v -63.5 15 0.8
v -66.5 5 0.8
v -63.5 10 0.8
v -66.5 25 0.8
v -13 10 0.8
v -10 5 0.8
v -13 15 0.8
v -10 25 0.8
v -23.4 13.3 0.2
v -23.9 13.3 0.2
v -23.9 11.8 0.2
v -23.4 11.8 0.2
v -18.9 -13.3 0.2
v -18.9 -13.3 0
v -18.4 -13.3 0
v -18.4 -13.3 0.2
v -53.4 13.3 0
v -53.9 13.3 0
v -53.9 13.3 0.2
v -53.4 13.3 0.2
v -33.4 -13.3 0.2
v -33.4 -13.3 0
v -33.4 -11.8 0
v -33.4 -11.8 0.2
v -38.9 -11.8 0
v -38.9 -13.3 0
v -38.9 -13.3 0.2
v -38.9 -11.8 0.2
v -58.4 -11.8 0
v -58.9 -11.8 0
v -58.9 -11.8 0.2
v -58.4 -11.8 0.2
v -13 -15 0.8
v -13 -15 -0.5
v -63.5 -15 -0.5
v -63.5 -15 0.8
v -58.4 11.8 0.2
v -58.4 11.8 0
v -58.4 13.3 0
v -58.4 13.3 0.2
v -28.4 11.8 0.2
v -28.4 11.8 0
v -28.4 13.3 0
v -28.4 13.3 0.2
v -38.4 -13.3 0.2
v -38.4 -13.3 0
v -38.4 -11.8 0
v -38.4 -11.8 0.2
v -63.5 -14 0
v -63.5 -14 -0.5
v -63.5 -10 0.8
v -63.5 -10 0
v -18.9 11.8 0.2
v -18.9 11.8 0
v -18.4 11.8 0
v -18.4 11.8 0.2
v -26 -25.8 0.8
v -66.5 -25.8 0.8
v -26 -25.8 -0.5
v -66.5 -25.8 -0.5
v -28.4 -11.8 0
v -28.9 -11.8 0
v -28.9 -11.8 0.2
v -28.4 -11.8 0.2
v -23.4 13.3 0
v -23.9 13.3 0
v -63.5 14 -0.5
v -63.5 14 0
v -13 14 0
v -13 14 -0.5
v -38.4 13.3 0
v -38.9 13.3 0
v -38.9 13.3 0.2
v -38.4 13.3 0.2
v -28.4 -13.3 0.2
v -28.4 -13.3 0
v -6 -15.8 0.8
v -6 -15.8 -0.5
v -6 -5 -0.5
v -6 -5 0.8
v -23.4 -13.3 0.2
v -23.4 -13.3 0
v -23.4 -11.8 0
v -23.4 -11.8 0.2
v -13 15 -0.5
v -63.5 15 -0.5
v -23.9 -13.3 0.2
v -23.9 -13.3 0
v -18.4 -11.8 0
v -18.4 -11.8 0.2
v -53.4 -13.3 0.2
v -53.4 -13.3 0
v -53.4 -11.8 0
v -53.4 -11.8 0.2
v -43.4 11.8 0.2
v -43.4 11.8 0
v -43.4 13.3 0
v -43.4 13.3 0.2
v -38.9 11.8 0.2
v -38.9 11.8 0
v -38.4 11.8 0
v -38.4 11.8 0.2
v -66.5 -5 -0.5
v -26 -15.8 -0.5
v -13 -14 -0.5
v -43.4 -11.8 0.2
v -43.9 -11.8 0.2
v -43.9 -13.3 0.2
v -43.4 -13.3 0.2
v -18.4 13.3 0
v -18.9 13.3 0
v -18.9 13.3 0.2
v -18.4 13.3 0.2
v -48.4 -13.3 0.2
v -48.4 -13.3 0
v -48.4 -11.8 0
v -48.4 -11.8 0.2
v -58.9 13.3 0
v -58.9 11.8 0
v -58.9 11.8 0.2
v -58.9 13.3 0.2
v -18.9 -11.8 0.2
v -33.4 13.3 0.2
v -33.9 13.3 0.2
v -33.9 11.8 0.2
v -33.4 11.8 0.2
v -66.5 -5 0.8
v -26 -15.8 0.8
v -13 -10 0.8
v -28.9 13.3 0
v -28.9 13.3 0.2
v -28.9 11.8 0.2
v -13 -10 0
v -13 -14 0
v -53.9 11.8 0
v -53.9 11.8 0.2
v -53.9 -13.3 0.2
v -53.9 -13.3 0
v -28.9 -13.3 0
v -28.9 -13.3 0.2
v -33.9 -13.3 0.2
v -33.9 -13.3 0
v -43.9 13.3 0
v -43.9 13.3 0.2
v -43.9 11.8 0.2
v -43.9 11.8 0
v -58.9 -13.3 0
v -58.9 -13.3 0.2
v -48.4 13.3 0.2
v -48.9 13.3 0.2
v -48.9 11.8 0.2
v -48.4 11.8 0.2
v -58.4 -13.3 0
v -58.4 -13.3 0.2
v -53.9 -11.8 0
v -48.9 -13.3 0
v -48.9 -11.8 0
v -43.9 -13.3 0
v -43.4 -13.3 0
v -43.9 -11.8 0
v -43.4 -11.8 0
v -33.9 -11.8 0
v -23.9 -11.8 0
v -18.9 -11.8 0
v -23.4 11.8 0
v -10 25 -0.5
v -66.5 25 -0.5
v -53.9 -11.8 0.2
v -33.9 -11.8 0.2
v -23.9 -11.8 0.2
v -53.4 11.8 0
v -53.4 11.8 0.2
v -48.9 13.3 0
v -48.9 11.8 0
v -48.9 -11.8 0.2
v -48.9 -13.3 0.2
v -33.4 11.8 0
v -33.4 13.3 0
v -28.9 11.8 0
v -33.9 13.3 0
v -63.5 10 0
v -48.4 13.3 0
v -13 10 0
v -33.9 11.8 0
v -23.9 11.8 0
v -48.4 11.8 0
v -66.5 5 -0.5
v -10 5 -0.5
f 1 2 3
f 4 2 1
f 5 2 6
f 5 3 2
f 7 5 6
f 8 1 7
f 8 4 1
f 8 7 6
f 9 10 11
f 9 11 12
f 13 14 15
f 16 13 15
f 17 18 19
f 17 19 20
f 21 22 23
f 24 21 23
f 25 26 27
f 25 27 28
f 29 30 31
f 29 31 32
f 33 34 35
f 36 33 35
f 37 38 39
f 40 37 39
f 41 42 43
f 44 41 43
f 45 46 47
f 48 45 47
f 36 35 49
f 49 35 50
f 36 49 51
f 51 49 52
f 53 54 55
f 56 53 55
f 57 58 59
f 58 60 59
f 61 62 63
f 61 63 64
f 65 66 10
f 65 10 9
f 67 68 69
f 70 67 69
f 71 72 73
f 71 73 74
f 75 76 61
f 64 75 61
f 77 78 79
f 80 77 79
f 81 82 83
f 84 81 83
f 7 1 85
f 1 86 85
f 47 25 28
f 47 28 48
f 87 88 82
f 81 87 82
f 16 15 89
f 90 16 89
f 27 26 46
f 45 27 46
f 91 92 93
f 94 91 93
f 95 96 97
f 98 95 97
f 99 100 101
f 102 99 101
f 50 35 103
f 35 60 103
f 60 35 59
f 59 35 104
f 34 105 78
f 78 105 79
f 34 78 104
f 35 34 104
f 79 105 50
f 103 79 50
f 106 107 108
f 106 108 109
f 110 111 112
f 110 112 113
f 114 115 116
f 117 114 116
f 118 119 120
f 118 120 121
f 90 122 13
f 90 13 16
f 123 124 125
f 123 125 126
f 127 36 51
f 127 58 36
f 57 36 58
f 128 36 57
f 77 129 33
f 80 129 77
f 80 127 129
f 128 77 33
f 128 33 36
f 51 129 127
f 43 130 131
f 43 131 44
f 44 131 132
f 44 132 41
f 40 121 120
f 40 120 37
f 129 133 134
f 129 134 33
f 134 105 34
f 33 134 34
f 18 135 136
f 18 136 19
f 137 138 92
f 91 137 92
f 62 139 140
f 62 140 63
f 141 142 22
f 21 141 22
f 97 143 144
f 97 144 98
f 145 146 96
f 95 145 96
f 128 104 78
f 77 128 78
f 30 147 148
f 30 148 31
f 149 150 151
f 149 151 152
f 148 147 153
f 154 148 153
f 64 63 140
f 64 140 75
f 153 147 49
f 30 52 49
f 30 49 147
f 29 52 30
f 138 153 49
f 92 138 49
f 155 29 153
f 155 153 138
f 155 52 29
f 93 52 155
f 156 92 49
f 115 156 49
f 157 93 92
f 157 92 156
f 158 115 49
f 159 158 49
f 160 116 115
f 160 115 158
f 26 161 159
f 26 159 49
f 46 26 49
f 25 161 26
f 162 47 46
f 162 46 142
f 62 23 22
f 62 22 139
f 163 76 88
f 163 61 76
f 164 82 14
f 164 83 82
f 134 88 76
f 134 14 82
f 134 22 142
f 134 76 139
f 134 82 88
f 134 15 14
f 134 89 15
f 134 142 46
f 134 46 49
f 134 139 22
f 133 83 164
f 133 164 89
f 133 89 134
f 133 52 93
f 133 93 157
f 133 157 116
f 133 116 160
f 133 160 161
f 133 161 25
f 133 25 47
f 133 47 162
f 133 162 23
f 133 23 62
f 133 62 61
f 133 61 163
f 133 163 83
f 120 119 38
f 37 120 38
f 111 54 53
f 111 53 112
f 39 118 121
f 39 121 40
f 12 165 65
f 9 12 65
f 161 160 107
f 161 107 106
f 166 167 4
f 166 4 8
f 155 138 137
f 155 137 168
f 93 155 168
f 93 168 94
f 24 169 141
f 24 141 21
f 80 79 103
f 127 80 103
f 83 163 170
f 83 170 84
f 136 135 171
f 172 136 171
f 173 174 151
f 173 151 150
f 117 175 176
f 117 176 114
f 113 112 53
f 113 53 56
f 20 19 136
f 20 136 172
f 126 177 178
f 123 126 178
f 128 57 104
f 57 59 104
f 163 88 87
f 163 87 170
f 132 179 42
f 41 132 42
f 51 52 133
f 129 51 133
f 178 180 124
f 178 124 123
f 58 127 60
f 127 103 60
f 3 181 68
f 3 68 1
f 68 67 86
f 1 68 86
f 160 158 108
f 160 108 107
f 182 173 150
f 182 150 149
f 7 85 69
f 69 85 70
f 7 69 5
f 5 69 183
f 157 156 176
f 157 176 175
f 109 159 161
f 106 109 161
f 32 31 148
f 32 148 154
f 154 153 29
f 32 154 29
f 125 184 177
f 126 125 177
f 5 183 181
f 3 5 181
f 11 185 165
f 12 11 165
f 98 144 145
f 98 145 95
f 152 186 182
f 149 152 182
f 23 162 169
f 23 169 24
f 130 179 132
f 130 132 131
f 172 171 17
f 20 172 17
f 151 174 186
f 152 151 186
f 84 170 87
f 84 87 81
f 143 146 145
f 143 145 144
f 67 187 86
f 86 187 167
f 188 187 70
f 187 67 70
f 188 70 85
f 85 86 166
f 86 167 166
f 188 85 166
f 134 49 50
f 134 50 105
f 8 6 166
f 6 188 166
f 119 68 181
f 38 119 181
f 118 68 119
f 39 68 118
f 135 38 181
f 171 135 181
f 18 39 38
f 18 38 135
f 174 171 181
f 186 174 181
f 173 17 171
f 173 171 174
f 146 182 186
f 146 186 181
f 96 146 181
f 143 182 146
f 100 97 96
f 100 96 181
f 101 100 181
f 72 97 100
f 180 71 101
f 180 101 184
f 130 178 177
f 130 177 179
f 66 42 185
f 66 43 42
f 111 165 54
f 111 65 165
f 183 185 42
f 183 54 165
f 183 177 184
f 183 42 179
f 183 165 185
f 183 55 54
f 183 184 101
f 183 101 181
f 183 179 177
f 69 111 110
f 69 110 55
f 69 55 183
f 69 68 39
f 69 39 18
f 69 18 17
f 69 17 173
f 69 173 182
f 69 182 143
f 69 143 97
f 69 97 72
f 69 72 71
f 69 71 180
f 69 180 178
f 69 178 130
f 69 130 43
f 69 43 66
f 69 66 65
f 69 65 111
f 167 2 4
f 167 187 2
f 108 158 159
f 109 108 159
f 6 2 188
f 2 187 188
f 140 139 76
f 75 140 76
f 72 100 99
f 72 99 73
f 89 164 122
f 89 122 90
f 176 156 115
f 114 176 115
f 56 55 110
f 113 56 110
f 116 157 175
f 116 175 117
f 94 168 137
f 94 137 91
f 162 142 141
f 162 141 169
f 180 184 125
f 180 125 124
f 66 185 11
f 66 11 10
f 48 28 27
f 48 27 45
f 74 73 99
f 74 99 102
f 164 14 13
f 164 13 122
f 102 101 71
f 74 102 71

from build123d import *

# Parameters (mm, degrees)
F0_W     = 56.5
F0_H     = 20
F0_W_2   = 50.5
F0_H_2   = 4
F1_DEPTH = 0.5
F2_DEPTH = 0.8
F3_W     = 0.5
F3_H     = 1.5
F4_DEPTH = 0.2
F5_DEPTH = 0.8
F6_W     = 0.5
F6_H     = 1.5
F7_DEPTH = 0.2


with BuildPart() as f1:
    # F0 (on Top) → F1 (new body)
    with BuildSketch(Plane.XY):
        with Locations((-38.25, 15)):
            Rectangle(F0_W, F0_H)
        Polygon((-63.5, 10), (-63.5, 14), (-63.5, 15), (-13, 15), (-13, 14), (-13, 10), align=None, mode=Mode.SUBTRACT)
        with Locations((-38.25, 12)):
            Rectangle(F0_W_2, F0_H_2)
        Polygon((-6, -5), (-66.5, -5), (-66.5, -25.8), (-26, -25.8), (-26, -20.8), (-26, -15.8), (-13, -15.8), (-6, -15.8), align=None)
        Polygon((-63.5, -15), (-63.5, -14), (-63.5, -10), (-13, -10), (-13, -14), (-13, -15), align=None, mode=Mode.SUBTRACT)
        with Locations((-38.25, -12)):
            Rectangle(F0_W_2, F0_H_2)
    extrude(amount=-F1_DEPTH)

    # F0 (on Top) → F2 (join)
    with BuildSketch(Plane.XY):
        with Locations((-38.25, 15)):
            Rectangle(F0_W, F0_H)
        Polygon((-63.5, 10), (-63.5, 14), (-63.5, 15), (-13, 15), (-13, 14), (-13, 10), align=None, mode=Mode.SUBTRACT)
    extrude(amount=F2_DEPTH)

    # F3 (on face) → F4 (join)
    with BuildSketch(Plane.XY):
        with Locations((-58.65, 12.55)):
            Rectangle(F3_W, F3_H)
        with Locations((-53.65, 12.55)):
            Rectangle(F3_W, F3_H)
        with Locations((-48.65, 12.55)):
            Rectangle(F3_W, F3_H)
        with Locations((-43.65, 12.55)):
            Rectangle(F3_W, F3_H)
        with Locations((-38.65, 12.55)):
            Rectangle(F3_W, F3_H)
        with Locations((-33.65, 12.55)):
            Rectangle(F3_W, F3_H)
        with Locations((-28.65, 12.55)):
            Rectangle(F3_W, F3_H)
        with Locations((-23.65, 12.55)):
            Rectangle(F3_W, F3_H)
        with Locations((-18.65, 12.55)):
            Rectangle(F3_W, F3_H)
    extrude(amount=F4_DEPTH)

    # F0 (on Top) → F5 (join)
    with BuildSketch(Plane.XY):
        Polygon((-6, -5), (-66.5, -5), (-66.5, -25.8), (-26, -25.8), (-26, -20.8), (-26, -15.8), (-13, -15.8), (-6, -15.8), align=None)
        Polygon((-63.5, -15), (-63.5, -14), (-63.5, -10), (-13, -10), (-13, -14), (-13, -15), align=None, mode=Mode.SUBTRACT)
    extrude(amount=F5_DEPTH)

    # F6 (on face) → F7 (join)
    with BuildSketch(Plane.XY):
        with Locations((-58.65, -12.55)):
            Rectangle(F6_W, F6_H)
        with Locations((-53.65, -12.55)):
            Rectangle(F6_W, F6_H)
        with Locations((-48.65, -12.55)):
            Rectangle(F6_W, F6_H)
        with Locations((-43.65, -12.55)):
            Rectangle(F6_W, F6_H)
        with Locations((-38.65, -12.55)):
            Rectangle(F6_W, F6_H)
        with Locations((-33.65, -12.55)):
            Rectangle(F6_W, F6_H)
        with Locations((-28.65, -12.55)):
            Rectangle(F6_W, F6_H)
        with Locations((-23.65, -12.55)):
            Rectangle(F6_W, F6_H)
        with Locations((-18.65, -12.55)):
            Rectangle(F6_W, F6_H)
    extrude(amount=F7_DEPTH)


solid = f1.part
